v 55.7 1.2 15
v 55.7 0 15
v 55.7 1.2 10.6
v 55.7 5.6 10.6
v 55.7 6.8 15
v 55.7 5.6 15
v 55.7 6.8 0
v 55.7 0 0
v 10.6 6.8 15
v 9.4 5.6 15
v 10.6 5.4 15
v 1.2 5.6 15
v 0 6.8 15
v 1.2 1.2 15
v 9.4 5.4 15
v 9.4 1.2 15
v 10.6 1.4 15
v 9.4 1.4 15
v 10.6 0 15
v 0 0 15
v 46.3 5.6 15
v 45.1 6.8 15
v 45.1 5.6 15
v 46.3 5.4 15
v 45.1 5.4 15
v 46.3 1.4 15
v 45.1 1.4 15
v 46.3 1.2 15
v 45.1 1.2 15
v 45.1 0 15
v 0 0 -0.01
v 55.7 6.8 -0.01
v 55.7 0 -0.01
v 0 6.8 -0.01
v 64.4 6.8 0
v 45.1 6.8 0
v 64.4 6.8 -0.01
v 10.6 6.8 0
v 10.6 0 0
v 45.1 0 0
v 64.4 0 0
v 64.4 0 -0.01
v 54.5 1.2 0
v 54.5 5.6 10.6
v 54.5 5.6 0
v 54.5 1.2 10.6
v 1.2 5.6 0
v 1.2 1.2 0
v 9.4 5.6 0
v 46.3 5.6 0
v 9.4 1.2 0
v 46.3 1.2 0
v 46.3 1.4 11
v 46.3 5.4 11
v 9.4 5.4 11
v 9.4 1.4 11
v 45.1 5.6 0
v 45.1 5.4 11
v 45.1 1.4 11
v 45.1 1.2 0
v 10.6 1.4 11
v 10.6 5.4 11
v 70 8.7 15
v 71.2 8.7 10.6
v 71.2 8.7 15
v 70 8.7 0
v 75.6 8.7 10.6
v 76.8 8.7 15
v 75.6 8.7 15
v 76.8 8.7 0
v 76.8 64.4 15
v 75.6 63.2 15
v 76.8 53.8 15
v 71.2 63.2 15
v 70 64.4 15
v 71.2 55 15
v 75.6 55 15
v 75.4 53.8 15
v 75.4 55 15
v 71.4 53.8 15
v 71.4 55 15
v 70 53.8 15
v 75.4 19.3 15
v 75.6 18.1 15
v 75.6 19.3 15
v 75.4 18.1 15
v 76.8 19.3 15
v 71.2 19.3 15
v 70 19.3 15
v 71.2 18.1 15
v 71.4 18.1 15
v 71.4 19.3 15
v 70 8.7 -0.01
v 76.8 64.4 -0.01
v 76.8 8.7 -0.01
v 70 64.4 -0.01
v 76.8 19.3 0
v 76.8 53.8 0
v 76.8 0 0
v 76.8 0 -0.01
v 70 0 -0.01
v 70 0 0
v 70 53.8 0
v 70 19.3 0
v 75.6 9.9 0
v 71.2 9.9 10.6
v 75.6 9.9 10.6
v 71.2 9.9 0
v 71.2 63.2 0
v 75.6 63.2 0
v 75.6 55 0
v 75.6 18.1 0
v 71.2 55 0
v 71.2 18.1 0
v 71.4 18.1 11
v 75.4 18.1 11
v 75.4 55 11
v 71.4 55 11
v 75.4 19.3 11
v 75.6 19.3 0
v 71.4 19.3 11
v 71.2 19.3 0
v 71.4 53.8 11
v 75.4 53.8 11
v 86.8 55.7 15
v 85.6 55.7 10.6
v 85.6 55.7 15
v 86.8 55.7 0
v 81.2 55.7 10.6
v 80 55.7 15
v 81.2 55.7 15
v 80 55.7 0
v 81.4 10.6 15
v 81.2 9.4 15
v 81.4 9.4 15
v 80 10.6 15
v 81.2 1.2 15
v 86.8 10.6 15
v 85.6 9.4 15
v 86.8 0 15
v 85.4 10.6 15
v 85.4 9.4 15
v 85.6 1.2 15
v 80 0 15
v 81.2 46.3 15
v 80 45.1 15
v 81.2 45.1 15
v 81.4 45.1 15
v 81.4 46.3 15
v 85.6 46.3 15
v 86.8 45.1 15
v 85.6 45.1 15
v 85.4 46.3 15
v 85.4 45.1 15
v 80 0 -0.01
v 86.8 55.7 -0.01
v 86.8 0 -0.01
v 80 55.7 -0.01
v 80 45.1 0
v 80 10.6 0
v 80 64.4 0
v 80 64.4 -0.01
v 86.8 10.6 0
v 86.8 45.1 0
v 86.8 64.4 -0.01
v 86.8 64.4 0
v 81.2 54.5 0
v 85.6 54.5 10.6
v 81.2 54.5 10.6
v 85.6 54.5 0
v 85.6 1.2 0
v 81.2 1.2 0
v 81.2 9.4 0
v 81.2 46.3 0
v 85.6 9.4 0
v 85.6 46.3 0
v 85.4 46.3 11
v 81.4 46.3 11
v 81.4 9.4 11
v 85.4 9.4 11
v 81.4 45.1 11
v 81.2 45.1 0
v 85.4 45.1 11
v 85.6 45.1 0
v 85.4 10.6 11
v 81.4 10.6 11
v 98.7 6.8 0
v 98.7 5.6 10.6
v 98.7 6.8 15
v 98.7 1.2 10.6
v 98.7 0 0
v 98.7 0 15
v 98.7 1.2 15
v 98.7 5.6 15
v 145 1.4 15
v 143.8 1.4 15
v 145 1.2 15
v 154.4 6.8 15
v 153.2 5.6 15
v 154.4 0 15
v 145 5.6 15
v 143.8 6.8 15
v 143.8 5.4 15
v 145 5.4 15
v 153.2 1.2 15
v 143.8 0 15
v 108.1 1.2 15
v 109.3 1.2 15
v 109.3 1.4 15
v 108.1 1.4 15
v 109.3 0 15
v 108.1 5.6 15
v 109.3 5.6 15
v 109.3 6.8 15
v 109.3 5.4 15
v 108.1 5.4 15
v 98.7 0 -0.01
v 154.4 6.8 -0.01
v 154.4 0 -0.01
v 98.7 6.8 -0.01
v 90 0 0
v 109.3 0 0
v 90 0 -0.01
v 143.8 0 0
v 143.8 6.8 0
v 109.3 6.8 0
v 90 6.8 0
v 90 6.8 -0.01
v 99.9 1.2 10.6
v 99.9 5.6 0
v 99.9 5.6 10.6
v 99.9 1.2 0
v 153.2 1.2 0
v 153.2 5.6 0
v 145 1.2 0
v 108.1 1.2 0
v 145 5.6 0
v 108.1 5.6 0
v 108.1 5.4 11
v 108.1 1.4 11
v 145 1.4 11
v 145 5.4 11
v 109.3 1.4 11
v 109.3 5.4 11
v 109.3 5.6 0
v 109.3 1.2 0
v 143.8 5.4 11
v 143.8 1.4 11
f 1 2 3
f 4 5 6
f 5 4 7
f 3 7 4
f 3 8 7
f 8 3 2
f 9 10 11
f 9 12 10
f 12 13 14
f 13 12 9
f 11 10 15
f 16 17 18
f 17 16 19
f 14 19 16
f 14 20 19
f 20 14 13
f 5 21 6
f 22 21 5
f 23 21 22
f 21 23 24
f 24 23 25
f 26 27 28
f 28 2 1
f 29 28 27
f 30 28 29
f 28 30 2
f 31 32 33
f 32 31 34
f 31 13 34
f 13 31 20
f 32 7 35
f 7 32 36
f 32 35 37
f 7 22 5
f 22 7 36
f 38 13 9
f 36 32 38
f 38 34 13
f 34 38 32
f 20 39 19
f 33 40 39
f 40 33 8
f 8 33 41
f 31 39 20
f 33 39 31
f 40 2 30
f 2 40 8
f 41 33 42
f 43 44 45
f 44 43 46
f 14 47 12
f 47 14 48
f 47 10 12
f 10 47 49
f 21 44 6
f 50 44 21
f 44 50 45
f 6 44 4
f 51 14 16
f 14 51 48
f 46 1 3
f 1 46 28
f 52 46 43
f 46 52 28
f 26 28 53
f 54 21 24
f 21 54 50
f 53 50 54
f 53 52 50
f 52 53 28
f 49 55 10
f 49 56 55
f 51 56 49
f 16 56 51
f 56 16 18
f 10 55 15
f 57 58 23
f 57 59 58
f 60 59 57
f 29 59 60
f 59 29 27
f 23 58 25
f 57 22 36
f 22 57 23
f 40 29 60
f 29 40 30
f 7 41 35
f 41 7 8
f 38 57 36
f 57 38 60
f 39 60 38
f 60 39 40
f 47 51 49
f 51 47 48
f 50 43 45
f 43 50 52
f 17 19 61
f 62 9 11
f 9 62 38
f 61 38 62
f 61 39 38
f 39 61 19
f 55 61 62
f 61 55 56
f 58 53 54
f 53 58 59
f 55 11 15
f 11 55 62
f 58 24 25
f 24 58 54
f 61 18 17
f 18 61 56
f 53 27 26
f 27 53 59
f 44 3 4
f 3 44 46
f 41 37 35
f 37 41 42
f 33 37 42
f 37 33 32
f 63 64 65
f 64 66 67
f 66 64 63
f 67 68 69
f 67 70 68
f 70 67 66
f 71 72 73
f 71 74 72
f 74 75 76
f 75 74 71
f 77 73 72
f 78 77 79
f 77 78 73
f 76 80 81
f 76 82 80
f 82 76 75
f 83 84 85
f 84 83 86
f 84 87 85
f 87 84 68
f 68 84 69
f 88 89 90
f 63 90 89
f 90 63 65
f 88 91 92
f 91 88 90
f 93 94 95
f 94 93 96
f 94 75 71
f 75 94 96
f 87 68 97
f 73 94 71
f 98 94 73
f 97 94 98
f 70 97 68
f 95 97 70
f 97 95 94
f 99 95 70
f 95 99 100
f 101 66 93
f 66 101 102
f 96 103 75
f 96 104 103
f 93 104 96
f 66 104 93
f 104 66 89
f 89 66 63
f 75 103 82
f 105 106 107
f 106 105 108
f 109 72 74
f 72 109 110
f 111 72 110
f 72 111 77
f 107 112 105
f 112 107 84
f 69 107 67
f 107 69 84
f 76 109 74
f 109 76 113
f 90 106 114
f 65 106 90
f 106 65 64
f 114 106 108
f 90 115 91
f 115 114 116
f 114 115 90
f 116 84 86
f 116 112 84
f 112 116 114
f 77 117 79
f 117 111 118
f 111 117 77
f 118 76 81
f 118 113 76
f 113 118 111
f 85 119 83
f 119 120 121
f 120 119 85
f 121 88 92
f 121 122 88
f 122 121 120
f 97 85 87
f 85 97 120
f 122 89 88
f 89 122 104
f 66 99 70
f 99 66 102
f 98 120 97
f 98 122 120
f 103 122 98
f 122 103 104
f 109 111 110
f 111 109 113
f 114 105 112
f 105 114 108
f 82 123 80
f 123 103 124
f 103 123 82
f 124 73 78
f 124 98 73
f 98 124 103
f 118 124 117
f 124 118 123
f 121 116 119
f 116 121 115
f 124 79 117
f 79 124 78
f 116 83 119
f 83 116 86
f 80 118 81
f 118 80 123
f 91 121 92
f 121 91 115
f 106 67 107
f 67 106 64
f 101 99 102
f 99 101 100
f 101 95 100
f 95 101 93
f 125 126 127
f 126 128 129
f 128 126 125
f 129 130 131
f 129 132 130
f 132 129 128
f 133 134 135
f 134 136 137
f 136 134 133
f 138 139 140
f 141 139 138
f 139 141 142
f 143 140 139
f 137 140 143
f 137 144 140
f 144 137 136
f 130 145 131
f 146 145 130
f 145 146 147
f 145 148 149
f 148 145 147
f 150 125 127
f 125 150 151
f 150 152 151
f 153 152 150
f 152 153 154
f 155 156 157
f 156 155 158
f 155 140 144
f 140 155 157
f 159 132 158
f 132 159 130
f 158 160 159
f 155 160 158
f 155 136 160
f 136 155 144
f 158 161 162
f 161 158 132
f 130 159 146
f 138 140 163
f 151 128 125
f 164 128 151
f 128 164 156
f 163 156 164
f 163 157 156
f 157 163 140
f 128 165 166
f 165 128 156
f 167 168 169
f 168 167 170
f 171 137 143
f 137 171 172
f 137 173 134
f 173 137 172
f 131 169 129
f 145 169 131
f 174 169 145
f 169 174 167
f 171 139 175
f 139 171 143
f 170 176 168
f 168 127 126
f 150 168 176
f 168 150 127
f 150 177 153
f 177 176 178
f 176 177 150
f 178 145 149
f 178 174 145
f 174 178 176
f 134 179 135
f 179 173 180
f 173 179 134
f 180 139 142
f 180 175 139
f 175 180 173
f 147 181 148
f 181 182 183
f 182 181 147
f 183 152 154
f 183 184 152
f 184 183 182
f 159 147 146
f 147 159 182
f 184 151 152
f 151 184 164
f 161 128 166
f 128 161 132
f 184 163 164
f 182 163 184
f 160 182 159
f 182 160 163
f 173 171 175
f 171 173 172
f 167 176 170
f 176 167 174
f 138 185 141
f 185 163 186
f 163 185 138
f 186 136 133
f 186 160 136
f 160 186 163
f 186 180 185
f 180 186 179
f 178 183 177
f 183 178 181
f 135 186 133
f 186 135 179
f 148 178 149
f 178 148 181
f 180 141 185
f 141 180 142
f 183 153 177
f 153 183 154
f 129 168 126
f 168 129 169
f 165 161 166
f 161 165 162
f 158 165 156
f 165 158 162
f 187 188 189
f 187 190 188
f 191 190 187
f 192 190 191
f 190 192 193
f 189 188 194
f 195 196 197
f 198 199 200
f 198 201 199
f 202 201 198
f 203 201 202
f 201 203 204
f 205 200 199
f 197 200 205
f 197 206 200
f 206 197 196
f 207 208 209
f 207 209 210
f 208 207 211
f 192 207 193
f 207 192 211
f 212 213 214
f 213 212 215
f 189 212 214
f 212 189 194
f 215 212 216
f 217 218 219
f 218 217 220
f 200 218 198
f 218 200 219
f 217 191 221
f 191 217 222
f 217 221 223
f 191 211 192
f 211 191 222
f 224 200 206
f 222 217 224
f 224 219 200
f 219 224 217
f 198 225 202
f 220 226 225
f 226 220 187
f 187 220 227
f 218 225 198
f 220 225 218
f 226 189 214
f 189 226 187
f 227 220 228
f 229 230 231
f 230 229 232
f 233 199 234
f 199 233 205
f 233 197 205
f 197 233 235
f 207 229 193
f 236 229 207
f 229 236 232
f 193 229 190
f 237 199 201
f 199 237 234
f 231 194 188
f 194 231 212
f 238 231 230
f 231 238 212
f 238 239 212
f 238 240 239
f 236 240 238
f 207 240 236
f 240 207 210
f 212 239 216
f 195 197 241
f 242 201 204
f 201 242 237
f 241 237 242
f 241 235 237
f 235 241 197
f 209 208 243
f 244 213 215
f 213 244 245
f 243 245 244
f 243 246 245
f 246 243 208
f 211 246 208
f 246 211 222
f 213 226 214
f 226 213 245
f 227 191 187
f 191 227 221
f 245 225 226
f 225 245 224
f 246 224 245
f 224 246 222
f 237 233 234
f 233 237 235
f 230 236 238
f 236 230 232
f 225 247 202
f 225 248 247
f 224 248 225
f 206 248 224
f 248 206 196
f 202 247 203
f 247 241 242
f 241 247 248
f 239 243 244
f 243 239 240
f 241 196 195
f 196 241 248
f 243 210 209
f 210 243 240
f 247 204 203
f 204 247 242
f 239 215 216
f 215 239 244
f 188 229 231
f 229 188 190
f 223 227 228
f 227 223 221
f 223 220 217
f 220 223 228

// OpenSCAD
// file: ../../Base/Boxes.scad
// Fischertechnik Box Foundation
// Pre-designed Boxes

use <Constants.scad>

include <PlacementOptions.scad>

box190Width = 190;
box190Depth = 130;
box130Width = 130;
box130Depth = 95;
boxUsageHeight = 33.9;
boxWallThickness = 2.4;
boxBaseThickness = 1.0;
boxWebWidth = 3.0;

// getBoxWallThickness()
// Gets the wall thickness of a Fischertechnik Box

function getBoxWallThickness() = boxWallThickness;

// Gets the usable height of a fischertechnik box
function getBoxUsageHeight() = boxUsageHeight;

// Gets the thickness of the Fischertechnik box base.
function getBoxBaseThickness() = boxBaseThickness;

// Gets the width of a box web
function getBoxWebWidth() = boxWebWidth;

// Gets the usable inner space of a Box 190 as an x/y-list
function getBox190Space() = [
    box190Width - 2*getBoxWallThickness(), 
    box190Depth - 2*getBoxWallThickness() ];

// Imports the Fischertechnik empty box 130x190 mm and places it at position 0,0
// 190x130 are the outer sizes, the inner space is slightly smaller. Use getBox190Space() to get the inner sizes.
// This module needs the STL file "Fischertechnik Box 130x190.stl" in the library path.
// The box is positioned that the usable inner space is at the 0,0,0 position. The

module Box190() {
    translate([-getBoxWallThickness(),-getBoxWallThickness(),-getBoxBaseThickness()])
        import("Fischertechnik Box 130x190.stl", convexity=3);
}

// Gets the usable inner space of a Box 130 as an x/y-list
function getBox130Space() = [
    box130Width - 2*getBoxWallThickness(), 
    box130Depth - 2*getBoxWallThickness() ];

// Imports the Fischertechnik empty box 95x130 mm and places it at position 0,0
// 190x130 are the outer sizes, the inner space is slightly smaller. Use getBox190Space() to get the inner sizes.
// This module needs the STL file "Fischertechnik Box 95x130.stl" in the library path.
// The box is positioned that the usable inner space is at the 0,0,0 position. The

module Box130() {
    translate([-getBoxWallThickness(),-getBoxWallThickness(),-getBoxBaseThickness()])
        import("Fischertechnik Box 95x130.stl", convexity=3);
}

// Creates a web at the specified box walls
// corner 0 = LowerLeft, 1 = UpperLeft, 2 = UpperRight, 3 = LowerRight
// side 0 = LeftOfCorner, 1 = RightOfCorner
// distance = Distance in mm from the corner
// box = inner width and depth of the box (default: Box 190)
// webWidth = length of the web (default is 3 mms)
// webThickness = thickness of the web (default is 1 mm)

module BoxWeb(corner, side, distance, box=getBox190Space(), webWidth=getBoxWebWidth(), webThickness=1.0) {
    sink = getBoxWallThickness()/2;

    width = (corner % 2 == 0) ? 
            (side == LeftOfCorner ? webWidth : webThickness) :
            (side == LeftOfCorner ? webThickness : webWidth);

    depth = (corner % 2 == 0) ? 
            (side == RightOfCorner ? webWidth : webThickness) :
            (side == RightOfCorner ? webThickness : webWidth);
    
    xDiff = corner == LowerLeft ? 
                (side == LeftOfCorner ? -sink : distance) :
            (corner == UpperLeft ?                
                (side == LeftOfCorner ? distance : -sink) :
            (corner == UpperRight ?
                (side == LeftOfCorner ? box.x-webWidth+sink : box.x-distance-webThickness) :
                (side == LeftOfCorner ? box.x-distance-webThickness: box.x-webWidth+sink)));

    yDiff = corner == LowerLeft ? 
                (side == RightOfCorner ? -sink : distance) :
            (corner == UpperLeft ?
                (side == RightOfCorner ? box.y-distance : box.y-webWidth+sink) :
            (corner == UpperRight ?
                (side == RightOfCorner ? box.y-webWidth+sink : box.y-distance) :
                (side == RightOfCorner ? distance : -sink)));
    
    translate([xDiff, yDiff, -getExcess()])
        cube([width, depth, boxUsageHeight + 2*getExcess()]);
}
// file: ../../Base/Rotation.scad
// Fischertechnik Box Foundation
// Geometry Helpers Rotation

include <PlacementOptions.scad>

// getRotatedSpace(space, rotation=NoRotation)
// Rotates the space dependent on the specified rotation

function getRotatedSpace(space, rotation=NoRotation) = [
    (rotation == Rotate90 || rotation == Rotate270) ? space.y : space.x,
    (rotation == Rotate90 || rotation == Rotate270) ? space.x : space.y
];

// Rotates the given space around the fixed left lower corner
// space = the space the children needs as width/depth list [width,depth]
// rotation = 0 Rotate0 degrees, 1 Rotate90 degrees, 2 Rotate180 degrees, 3 Rotate270 degrees (equivalent to -90)

module RotateFix(space, rotation=NoRotation) {
    dy = (rotation == Rotate0 || rotation == Rotate270) ? 0 :
        (rotation == Rotate90) ? space.x :
        space.y;
    dx = (rotation < Rotate180) ? 0 :
        (rotation == Rotate180) ? space.x :
        space.y;
    
    translate([dx, dy, 0])
        rotate([0, 0, rotations[rotation]])
            children();
}
// file: ../../Base/Alignment.scad
// Fischertechnik Box Foundation
// Geometry Helpers Alignment

include <PlacementOptions.scad>

// getAlignedX(elementWidth, spaceWidth, align=AlignRight, offset=0)
// Gets the aligned X offset of an element with the given
// width in the given space.
// elementWidth = The width of the element to positon
// spaceWidth = The space where the element should be aligned
// align = 0 AlignLeft, 1 AlignCenter, 2 AlignRight
// offset = an optional offset from the aligned position. When
// aligned left or centered, then positive values are in X direction.
// When aligned right then positive values are in negative X direction.

function getAlignedX(elementWidth, spaceWidth, align=AlignRight, offset=0) =
    (align == AlignLeft) ?
        offset :
        ((align == AlignCenter) ?
        (spaceWidth - elementWidth)/2 + offset :
        spaceWidth - offset - elementWidth);

// getAlignedY(elementDepth, spaceDepth, align=AlignTop, offset=0)
// Gets the aligned Y offset of an element with the given
// depth in the given space.
// elementDepth = The depth of the element to positon
// spaceDepth = The space where the element should be aligned
// align = 0 AlignBottom, 1 AlignCenter, 2 AlignTop
// offset = an optional offset from the aligned position. When
// aligned bottom or centered, then positive values are in Y direction.
// When aligned top then positive values are in negative Y direction.

function getAlignedY(elementDepth, spaceDepth, align=AlignTop, offset=0) =
    (align == AlignBottom) ?
        offset :
        ((align == AlignCenter) ?
        (spaceDepth - elementDepth)/2 + offset :
        spaceDepth - offset - elementDepth);
// file: ../../Base/Constants.scad
// Fischertechnik Box Foundation
// Constants

// Constant values necessary for multiple elements

// Base constants
dividerThickness = 1.2;
excess = 0.01;
fragments = 90;
tolerance = 0.8;

// Gets the thickness of a divider 
function getDividerThickness() = dividerThickness;

// Gets the excess that is used to merge walls into each other
function getExcess() = excess;

// Gets amount of fragments of a cylinder
function getFragments() = fragments;

// Gets the inner tolerance of a frame to each side
function getTolerance() = tolerance;


// Fischertechnik specific constants
axisDiameter = 4;
axisBottomDiameter = axisDiameter + 1;
axisTolerance = 0.2;
axisLockingLength = 8;

// Gets axis diameter of Fischertechnik axis
function getAxisDiameter() = axisDiameter;

// Gets axis diameter tolerance (subtracted for element axis)
function getAxisTolerance() = axisTolerance;

// Gets the axis diameter for standing axis
function getStandAxisDiameter() = getAxisDiameter() - getAxisTolerance();

// Gets axis bottom diameter for thicker part at the bottom
function getAxisBottomDiameter() = axisBottomDiameter;

// Gets the lengthh of the locking part of a locking axis
function getAxisLockingLength() = axisLockingLength;

// Studs

studHeight = 2.5;
studTolerance = 0.2;
studRailDistance = 9;   // as in ft 50

// gets the height of a connecting stud
function getStudHeight() = studHeight;

// gets the connecting stud height tolerance
function getStudTolerance() = studTolerance;

// gets the default rail distance for studs
function getStudRailDistance() = studRailDistance;

// Dockable Frame with Edge

standardEdgeDistance = 2.5;
standardWebDistance = 11.5;
standardCornerLength = 15;

// gets the standard distance to the wall of the box for dockable frames with webs
function getStandardEdgeDistance() = standardEdgeDistance;

// gets the standard distance of each web to the corner of the dockable frame
function getStandardWebDistance() = standardWebDistance;

// gets the standard length of the corner walls of a dockable frame
function getStandardCornerLength() = standardCornerLength;

// Tubes

tubeWallFactor = 0.8;

// gets the wall thickness of a tube.
function getTubeWallThickness() = tubeWallFactor * getDividerThickness();

// Small Parts and Divider Frame

smallPartsFrameHeight = 20;

// gets the frame height for docked small parts boxes.
function getSmallPartsFrameHeight() = smallPartsFrameHeight;

// Hubs

hubRingDiameter = 19.5;
hubRingLevelDiameter = 21;

// gets the diameter of a tube matching the inner ring of a wheel
function getHubRingDiameter() = hubRingDiameter;

// gets the diameter of a hub tube with a thicker diameter
function getHubRingLevelDiameter() = hubRingLevelDiameter;

// Struts

strutAddLength = 9.0;
strutDepth = 8.0;
strutThickness = 2.8;
strutOuterTolerance = 0.6;

// gets the full length of a strut (nominal length plus 2x radius at the ends)
function getFullStrutLength(length) = length + strutAddLength;

// gets the radius of the end of a strut
function getStrutEndRadius() = strutAddLength / 2;

// gets the the depth (width) of a strut
function getStrutDepth() = strutDepth;

// gets the the thickness of a strut
function getStrutThickness() = strutThickness;

// gets the tolerance added to the strut sizes for strut holders
function getStrutOuterTolerance() = strutOuterTolerance;

// Propeller

propellerAxisDiameter = 7.0;
propellerAxisTolerance = 0.2;

// gets the propeller axis outer diameter
function getPropellerAxisDiameter() = propellerAxisDiameter;

// gets the propeller axis printing tolerance
function getPropellerAxisTolerance() = propellerAxisTolerance;
// file: ../../Base/PlacementOptions.scad
// Fischertechnik Box Foundation
// Placement Options

// Alignment
NoAlign = 0;
AlignLeft = 1;
AlignBottom = 2;
AlignCenter = 3;
AlignRight = 4;
AlignTop = 5;

// Element rotation degree steps
rotations = [0, -90, -180, -270];

// Rotation
NoRotation = 0;
Rotate0 = 0;
Rotate90 = 1;
Rotate180 = 2;
Rotate270 = 3;

// Docking (seen from above)
NoDock = -1;
DockLeft = 0;
DockTop = 1;
DockRight = 2;
DockCorner = 2;
DockBottom = 3;

// Web corners
LowerLeft = 0;
UpperLeft = 1;
UpperRight = 2;
LowerRight = 3;

// Web position relative to corner
LeftOfCorner = 0;
RightOfCorner = 1;
// file: ../../Elements/FrameAxis60Open.scad
// Fischertechnik Box Library
// Frame for single 60 mm Axis in 55mm distance and one open (mot1)
// 31032

use <../Base/Constants.scad>
use <../ModelBase/Simple.scad>
use <../ModelBase/Complex.scad>

/* [Hidden] */
length = 52.5;

// getFrameAxis60OpenSpace()
// Gets the width (.x) and depth (.y) of the axis frame.

function getFrameAxis60OpenSpace() = [
    getFrameAxisSpace(length).x + 7.5 + getDividerThickness(),
    getFrameAxisSpace(length).y,
    getFrameAxisSpace(length).z];

// FrameAxis60Open()
// Axis holder for a single 60 mm axis.

module FrameAxis60Open() {
    Space(getFrameAxis60OpenSpace());
    
    difference() {
        FrameAxis(length);
        translate([length+getDividerThickness(), getDividerThickness(), getFrameAxisHeight()-getFrameAxisDepth()])
            cube([getDividerThickness()*2, getFrameAxisDepth(), getFrameAxisDepth() + getExcess()]);
    }
}

// Test
color("lightgray")
FrameAxis60Open();
// file: ../../Base/Placement.scad
// Fischertechnik Box Foundation
// Geometry Helpers Placement

use <Constants.scad>
use <Alignment.scad>
use <Rotation.scad>
use <Boxes.scad>

include <PlacementOptions.scad>

// Place(x=0, y=0, elementSpace=[0,0], alignX=AlignLeft, alignY=AlignBottom, rotation=Rotate0, boxSpace=getBox190Space())
// Places the child at the specified position
// y = Y-Position. This is a relative position when an X aligment is specified.
// x = X-Position. This is a relative position when an Y aligment is specified.
// elementSpace = space of the element to be placed [x,y]
// alignX = -1=NoAlign, 0 AlignLeft, 1 AlignCenter, 3 AlignRight (elementSpace and boxSpace required!)
// alignY = -1=NoAlign, 2 AlignBottom, 1 AlignCenter, 4 AlignTop (elementSpace and boxSpace required!)
// rotation = 0 Rotate0 0 degrees, 1 Rotate90 90 degrees, 
// 2 Rotate180 180 degrees, 3 Rotate270 270 degrees (equivalent to -90)
// boxSpace = Inner space of the box where the placement occurs [x,y] - default is Box 190x130 inner space

module Place(x=0, y=0, elementSpace=[0,0], 
  alignX=AlignLeft, alignY=AlignBottom, 
  rotation=NoRotation, boxSpace=getBox190Space()) {

    module Position(x, y, space, rotation=Rotate0) {
        translate([x, y, 0])
            RotateFix(space, rotation)
                children();
    }

    space = getRotatedSpace(elementSpace, rotation);
    alignedX = getAlignedX(space.x, boxSpace.x, alignX, x);
    alignedY = getAlignedY(space.y, boxSpace.y, alignY, y);
    Position(alignedX, alignedY, elementSpace, rotation)
        children();
}

// Center(space=getBox130Space(), elementSpace=[0,0])
// space = Space where the children is centered. For cylinder use centered=true and no elementSpace.
// elementSpace = space of the element to be centered [x,y]

module Center(space=getBox190Space(), elementSpace=[0,0]) {
    translate([(space.x - elementSpace.x) / 2, (space.y - elementSpace.y) / 2])
        children(0);
}

// CenterHorizontal(width=0, y=0, offset=0, space=getBox130Space())
// space = Space where the children is centered. For cylinder use centered=true and no elementSpace.
// elementSpace = space of the element to be centered [x,y]

module CenterHorizontal(width=0, y=0, offset=0, space=getBox190Space()) {
    translate([(space.x - width) / 2 + offset, y])
        children(0);
}

// CenterVertical(depth=0, x=0, offset=0, space=getBox130Space())
// space = Space where the children is centered. For cylinder use centered=true and no elementSpace.
// elementSpace = space of the element to be centered [x,y]

module CenterVertical(depth=0, x=0, offset=0, space=getBox190Space()) {
    translate([x, (space.y - depth) / 2 + offset])
        children(0);
}
// main file
// Fischertechnik Box Foundation
// Elements
// Test FrameAxis60Open

use <../../Base/Placement.scad>
use <../../Elements/FrameAxis60Open.scad>

include <../../Base/PlacementOptions.scad>

FrameAxis60Open();

Place(70, 0, getFrameAxis60OpenSpace(), rotation=Rotate90)
    FrameAxis60Open();

Place(80, 0, getFrameAxis60OpenSpace(), rotation=Rotate270)
    FrameAxis60Open();

Place(90, 0, getFrameAxis60OpenSpace(), rotation=Rotate180)
    FrameAxis60Open();
